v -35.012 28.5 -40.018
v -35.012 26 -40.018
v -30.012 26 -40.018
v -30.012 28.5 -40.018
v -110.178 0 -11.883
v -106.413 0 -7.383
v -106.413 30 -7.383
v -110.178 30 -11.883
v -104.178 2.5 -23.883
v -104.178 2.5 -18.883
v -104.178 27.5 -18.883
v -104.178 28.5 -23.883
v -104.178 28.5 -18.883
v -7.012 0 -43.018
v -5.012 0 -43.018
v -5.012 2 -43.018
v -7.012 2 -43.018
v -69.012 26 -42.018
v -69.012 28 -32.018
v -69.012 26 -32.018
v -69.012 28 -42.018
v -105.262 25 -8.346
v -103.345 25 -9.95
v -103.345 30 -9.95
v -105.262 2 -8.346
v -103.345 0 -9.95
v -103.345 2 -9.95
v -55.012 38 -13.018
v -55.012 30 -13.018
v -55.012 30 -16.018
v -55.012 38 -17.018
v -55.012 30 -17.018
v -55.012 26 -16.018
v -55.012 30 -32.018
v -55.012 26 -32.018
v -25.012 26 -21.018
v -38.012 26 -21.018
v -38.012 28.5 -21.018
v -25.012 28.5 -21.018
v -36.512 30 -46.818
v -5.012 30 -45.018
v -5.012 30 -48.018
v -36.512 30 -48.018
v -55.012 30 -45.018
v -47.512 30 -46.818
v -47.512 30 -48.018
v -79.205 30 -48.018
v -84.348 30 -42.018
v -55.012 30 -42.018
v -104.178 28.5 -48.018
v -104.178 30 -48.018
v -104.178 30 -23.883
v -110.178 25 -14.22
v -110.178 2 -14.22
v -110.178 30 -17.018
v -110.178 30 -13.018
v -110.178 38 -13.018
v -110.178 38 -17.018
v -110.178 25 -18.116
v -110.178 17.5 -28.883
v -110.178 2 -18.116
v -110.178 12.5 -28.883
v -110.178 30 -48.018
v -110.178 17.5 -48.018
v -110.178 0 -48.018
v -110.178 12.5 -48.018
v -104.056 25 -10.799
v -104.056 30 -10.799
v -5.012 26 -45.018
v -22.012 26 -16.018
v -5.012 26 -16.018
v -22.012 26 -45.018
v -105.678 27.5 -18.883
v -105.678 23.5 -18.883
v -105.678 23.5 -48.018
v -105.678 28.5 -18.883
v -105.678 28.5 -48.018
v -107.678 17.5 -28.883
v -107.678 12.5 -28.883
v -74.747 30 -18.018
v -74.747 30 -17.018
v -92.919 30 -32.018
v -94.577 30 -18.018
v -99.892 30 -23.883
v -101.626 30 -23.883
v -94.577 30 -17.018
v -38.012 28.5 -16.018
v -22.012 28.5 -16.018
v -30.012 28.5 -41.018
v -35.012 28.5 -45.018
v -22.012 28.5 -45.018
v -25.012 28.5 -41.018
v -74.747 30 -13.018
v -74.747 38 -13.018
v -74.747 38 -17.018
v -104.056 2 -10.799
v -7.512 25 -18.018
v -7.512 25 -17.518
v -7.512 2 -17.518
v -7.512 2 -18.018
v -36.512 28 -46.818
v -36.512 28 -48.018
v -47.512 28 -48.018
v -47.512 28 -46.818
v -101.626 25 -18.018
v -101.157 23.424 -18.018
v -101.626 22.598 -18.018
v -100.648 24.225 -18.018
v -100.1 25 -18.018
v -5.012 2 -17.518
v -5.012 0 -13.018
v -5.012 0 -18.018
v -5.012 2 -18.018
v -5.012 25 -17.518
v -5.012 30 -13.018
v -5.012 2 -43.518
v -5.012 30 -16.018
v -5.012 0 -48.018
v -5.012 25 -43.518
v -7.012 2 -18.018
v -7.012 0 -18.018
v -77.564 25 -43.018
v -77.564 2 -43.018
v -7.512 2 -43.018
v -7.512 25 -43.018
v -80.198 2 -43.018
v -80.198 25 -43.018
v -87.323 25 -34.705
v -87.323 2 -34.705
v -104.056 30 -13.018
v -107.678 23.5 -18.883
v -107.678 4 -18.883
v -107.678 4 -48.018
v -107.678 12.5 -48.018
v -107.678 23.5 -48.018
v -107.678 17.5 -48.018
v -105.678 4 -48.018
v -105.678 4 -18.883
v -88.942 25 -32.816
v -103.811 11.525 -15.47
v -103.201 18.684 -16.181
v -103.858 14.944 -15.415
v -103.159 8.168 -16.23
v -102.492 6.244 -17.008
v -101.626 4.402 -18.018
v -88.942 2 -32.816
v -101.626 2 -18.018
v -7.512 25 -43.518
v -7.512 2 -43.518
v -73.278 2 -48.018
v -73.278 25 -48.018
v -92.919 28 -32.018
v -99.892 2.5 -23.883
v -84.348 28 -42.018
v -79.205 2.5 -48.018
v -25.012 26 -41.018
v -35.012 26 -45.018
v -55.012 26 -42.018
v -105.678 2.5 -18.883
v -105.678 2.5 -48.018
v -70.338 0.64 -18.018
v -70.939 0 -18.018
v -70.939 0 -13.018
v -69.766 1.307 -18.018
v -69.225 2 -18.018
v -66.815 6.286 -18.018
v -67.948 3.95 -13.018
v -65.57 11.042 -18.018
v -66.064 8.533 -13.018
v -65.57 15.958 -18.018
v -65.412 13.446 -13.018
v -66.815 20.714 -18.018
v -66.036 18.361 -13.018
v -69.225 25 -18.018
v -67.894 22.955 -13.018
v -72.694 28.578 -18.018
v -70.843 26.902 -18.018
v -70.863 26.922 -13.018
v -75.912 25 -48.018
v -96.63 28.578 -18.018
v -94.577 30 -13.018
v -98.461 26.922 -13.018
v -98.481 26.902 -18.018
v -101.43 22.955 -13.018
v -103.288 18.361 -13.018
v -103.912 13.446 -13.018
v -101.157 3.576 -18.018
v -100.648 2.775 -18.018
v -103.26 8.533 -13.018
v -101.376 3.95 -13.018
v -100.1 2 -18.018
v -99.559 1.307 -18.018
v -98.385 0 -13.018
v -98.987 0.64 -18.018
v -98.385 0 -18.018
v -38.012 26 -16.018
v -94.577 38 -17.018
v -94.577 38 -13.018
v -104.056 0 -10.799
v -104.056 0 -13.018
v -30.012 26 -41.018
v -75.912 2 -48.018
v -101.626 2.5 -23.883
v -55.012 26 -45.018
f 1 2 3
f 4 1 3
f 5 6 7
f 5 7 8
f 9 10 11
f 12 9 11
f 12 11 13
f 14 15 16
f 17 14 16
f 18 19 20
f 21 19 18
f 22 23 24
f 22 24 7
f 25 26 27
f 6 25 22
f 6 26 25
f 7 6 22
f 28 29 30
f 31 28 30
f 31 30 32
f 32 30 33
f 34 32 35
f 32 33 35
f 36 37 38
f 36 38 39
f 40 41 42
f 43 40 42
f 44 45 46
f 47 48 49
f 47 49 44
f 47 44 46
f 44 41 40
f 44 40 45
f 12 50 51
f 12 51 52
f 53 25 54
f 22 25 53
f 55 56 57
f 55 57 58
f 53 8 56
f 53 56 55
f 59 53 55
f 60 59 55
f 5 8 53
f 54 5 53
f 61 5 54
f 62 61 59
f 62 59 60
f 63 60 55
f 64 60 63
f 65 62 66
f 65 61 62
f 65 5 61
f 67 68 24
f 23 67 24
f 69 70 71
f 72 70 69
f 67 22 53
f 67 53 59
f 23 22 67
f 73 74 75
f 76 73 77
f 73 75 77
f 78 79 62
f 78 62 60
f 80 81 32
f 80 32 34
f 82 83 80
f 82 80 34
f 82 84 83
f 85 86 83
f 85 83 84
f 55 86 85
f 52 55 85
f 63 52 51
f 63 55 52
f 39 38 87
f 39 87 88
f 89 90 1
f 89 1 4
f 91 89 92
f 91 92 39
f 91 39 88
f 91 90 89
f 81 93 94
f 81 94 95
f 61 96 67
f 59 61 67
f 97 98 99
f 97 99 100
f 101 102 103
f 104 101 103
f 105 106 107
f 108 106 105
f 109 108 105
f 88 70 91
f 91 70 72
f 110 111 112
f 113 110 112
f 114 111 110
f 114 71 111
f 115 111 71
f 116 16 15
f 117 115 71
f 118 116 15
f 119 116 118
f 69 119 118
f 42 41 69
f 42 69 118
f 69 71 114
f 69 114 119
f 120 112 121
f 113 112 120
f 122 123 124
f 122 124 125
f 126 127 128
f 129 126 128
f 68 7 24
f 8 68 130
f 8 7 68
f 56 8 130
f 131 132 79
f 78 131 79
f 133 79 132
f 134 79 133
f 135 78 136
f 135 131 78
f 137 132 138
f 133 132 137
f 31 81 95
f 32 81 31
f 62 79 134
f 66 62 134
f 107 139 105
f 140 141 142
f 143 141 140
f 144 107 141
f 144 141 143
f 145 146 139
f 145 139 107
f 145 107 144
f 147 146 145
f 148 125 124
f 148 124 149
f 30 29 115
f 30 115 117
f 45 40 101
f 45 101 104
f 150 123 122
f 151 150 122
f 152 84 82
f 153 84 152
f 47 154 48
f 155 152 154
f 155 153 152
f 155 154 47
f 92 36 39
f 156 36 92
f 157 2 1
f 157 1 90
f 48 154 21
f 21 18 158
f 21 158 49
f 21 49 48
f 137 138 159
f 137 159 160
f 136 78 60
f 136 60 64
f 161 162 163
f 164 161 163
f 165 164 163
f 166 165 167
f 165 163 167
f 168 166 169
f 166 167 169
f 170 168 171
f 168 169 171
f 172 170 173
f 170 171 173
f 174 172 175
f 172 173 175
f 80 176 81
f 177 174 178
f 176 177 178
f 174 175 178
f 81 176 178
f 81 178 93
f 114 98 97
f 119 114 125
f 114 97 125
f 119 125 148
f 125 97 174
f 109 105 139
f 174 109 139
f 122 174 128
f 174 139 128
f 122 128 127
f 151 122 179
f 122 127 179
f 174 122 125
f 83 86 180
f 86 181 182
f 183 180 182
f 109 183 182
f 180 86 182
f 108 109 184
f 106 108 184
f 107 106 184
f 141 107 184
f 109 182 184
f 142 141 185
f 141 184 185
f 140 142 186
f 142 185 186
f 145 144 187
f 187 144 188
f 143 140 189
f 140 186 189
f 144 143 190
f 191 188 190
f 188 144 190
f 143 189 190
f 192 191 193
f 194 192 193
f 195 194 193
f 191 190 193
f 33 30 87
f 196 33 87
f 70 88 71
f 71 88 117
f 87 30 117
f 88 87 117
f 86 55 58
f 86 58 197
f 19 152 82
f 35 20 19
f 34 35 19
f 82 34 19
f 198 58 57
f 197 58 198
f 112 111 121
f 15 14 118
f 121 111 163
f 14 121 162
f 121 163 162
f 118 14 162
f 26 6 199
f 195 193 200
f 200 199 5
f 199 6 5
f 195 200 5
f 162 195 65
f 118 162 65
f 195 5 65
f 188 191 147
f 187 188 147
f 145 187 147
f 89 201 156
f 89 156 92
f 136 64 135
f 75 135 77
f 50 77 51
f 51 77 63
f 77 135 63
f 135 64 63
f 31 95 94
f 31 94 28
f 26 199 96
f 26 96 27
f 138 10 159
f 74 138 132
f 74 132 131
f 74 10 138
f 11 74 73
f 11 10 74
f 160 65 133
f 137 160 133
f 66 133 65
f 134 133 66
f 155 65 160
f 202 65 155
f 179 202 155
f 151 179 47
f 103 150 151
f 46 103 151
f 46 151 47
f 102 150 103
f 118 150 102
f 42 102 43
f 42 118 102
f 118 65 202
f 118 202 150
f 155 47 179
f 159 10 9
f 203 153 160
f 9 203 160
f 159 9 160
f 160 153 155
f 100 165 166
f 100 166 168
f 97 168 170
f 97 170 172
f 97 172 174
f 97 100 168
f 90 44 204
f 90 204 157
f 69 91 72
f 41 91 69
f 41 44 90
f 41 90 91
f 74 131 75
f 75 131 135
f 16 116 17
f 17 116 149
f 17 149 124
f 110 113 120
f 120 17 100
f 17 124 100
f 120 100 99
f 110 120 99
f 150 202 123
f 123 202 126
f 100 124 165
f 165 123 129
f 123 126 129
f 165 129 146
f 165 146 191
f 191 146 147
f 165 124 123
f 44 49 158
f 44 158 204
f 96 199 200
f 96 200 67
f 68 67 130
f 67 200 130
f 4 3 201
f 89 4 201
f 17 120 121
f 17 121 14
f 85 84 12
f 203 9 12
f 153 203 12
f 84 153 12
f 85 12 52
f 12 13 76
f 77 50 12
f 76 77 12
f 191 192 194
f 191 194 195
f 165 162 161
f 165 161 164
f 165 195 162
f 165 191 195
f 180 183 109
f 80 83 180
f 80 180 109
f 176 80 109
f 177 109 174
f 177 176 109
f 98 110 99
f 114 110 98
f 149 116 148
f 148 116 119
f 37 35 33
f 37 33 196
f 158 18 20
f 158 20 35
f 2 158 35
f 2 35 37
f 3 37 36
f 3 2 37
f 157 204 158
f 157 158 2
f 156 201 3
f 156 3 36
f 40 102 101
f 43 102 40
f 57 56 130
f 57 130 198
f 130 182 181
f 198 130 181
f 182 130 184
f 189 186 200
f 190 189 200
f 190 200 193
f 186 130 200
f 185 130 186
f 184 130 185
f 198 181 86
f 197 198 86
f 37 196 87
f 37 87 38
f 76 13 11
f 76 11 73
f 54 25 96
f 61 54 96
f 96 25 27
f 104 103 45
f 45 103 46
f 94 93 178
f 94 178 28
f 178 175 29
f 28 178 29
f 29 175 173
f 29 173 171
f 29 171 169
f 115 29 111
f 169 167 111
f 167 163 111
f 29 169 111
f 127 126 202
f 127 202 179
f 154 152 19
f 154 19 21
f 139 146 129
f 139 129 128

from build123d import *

# Parameters (mm, degrees)
BOSS_EXTRUDE3_DEPTH       = 30
SKETCH6_W                 = 25
SKETCH6_H                 = 23
CUT_EXTRUDE1_DEPTH        = 86
SKETCH7_W                 = 25
SKETCH7_H                 = 5
CUT_EXTRUDE2_DEPTH        = 7.5
SKETCH8_W                 = 25
SKETCH8_H                 = 2
CUT_EXTRUDE3_DEPTH        = 1
SKETCH9_R                 = 19.25
CUT_EXTRUDE4_DEPTH        = 5
BOSS_EXTRUDE4_DEPTH       = 30
SKETCH10_W                = 1.856561782
SKETCH10_H                = 30
BOSS_EXTRUDE5_DEPTH       = 3
BOSS_EXTRUDE6_DEPTH       = 30
SKETCH11_W                = 2.5
SKETCH11_H                = 23
CUT_EXTRUDE5_DEPTH        = 34.579503854
SKETCH12_W                = 29.135235428
SKETCH12_H                = 25
CUT_EXTRUDE6_DEPTH        = 3.5
SKETCH13_W                = 19.135235428
SKETCH13_H                = 5
CUT_EXTRUDE7_DEPTH        = 3.5
SKETCH14_W                = 29.135235428
SKETCH14_H                = 4
BOSS_EXTRUDE7_DEPTH       = 2
SKETCH16_W                = 29.135235428
SKETCH16_H                = 1.5
BOSS_EXTRUDE8_DEPTH       = 2
SKETCH17_W                = 2.551467674
SKETCH17_H                = 30
BOSS_EXTRUDE9_DEPTH       = 5
BOSS_EXTRUDE10_REACH      = 85.266
SKETCH18_W                = 29.135235428
SKETCH18_H                = 2.5
SKETCH19_W                = 2.48850009
SKETCH19_H                = 23
BOSS_EXTRUDE11_DEPTH      = 2
CUT_EXTRUDE8_START        = -2.4885
SKETCH20_W                = 2
SKETCH20_H                = 23
CUT_EXTRUDE8_DEPTH        = 21.736568
BOSS_EXTRUDE12_REACH      = 82.714
SKETCH21_W                = 2.023287715
SKETCH21_H                = 27.5
SKETCH22_W                = 35
SKETCH22_H                = 30
BOSS_EXTRUDE13_DEPTH      = 15.9
BOSS_EXTRUDE13_DEPTH_BACK = 7.5
SKETCH23_W                = 25
SKETCH23_H                = 23
CUT_EXTRUDE9_DEPTH        = 24.4
SKETCH24_W                = 25
SKETCH24_H                = 5
CUT_EXTRUDE10_DEPTH       = 2
SKETCH25_W                = 50
SKETCH25_H                = 29
CUT_EXTRUDE11_DEPTH       = 4
SKETCH26_W                = 3
SKETCH26_H                = 29
BOSS_EXTRUDE14_DEPTH      = 2.5
SKETCH27_W                = 5
SKETCH27_H                = 5
BOSS_EXTRUDE15_DEPTH      = 2.5
BOSS_EXTRUDE16_REACH      = 27
SKETCH28_W                = 4
SKETCH28_H                = 2.5
SKETCH29_W                = 13
SKETCH29_H                = 5
BOSS_EXTRUDE17_DEPTH      = 2.5
SKETCH30_W                = 10
SKETCH30_H                = 4
CUT_EXTRUDE12_DEPTH       = 14
CUT_EXTRUDE13_REACH       = 43.166
SKETCH31_W                = 10
SKETCH31_H                = 2
SKETCH32_W                = 2
SKETCH32_H                = 25
CUT_EXTRUDE14_DEPTH       = 27
SKETCH33_W                = 19.734733993
SKETCH33_H                = 4
BOSS_EXTRUDE18_DEPTH      = 8
SKETCH34_W                = 15.60048738
SKETCH34_H                = 4
BOSS_EXTRUDE19_DEPTH      = 8
SKETCH35_W                = 26
SKETCH35_H                = 23
CUT_EXTRUDE15_DEPTH       = 2.5
SKETCH36_W                = 25
SKETCH36_H                = 1
BOSS_EXTRUDE20_DEPTH      = 2
SKETCH39_W                = 1.5
SKETCH39_H                = 1
CUT_EXTRUDE16_DEPTH       = 29.135235
SKETCH42_W                = 11
SKETCH42_H                = 2
CUT_EXTRUDE17_DEPTH       = 1.2


with BuildPart() as part:
    # Sketch2 → Boss-Extrude3 (new body)
    with BuildSketch(Plane(origin=(0, 0, 0), x_dir=(1, 0, 0), z_dir=(0, 1, 0))):
        Polygon((-105.912162162, 13.018018018), (-20.912162162, 13.018018018), (-20.912162162, 48.018018018), (-75.912162162, 48.018018018), align=None)
    extrude(amount=BOSS_EXTRUDE3_DEPTH)

    # Sketch6 → Cut-Extrude1 (cut, through all)
    with BuildSketch(Plane(origin=(-20.912162162, 0, 0), x_dir=(0, 0, -1), z_dir=(1, 0, 0))):
        with Locations((30.518018018, 13.5)):
            Rectangle(SKETCH6_W, SKETCH6_H)
    extrude(amount=-CUT_EXTRUDE1_DEPTH, mode=Mode.SUBTRACT)

    # Sketch7 → Cut-Extrude2 (cut)
    with BuildSketch(Plane(origin=(-20.912162162, 0, 0), x_dir=(0, 0, -1), z_dir=(1, 0, 0))):
        with Locations((30.518018018, 27.5)):
            Rectangle(SKETCH7_W, SKETCH7_H)
    extrude(amount=-CUT_EXTRUDE2_DEPTH, mode=Mode.SUBTRACT)

    # Sketch8 → Cut-Extrude3 (cut)
    with BuildSketch(Plane(origin=(-20.912162162, 0, 0), x_dir=(0, 0, -1), z_dir=(1, 0, 0))):
        with Locations((30.518018018, 1)):
            Rectangle(SKETCH8_W, SKETCH8_H)
    extrude(amount=-CUT_EXTRUDE3_DEPTH, mode=Mode.SUBTRACT)

    # Sketch9 → Cut-Extrude4 (cut)
    with BuildSketch(Plane.XY.offset(-13.018018018)):
        with Locations((-84.662162162, 13.5)):
            Circle(SKETCH9_R)
    extrude(amount=-CUT_EXTRUDE4_DEPTH, mode=Mode.SUBTRACT)

    # Sketch3 → Boss-Extrude4 (add)
    with BuildSketch(Plane(origin=(0, 0, 0), x_dir=(1, 0, 0), z_dir=(0, 1, 0))):
        Polygon((-106.412808957, 7.383361614), (-110.17791555, 11.88278259), (-79.204856611, 48.018018018), (-75.912162162, 48.018018018), (-105.912162162, 13.018018018), (-103.345157358, 9.950366419), align=None)
    extrude(amount=BOSS_EXTRUDE4_DEPTH)

    # Sketch10 → Boss-Extrude5 (add)
    with BuildSketch(Plane.XY.offset(-13.018018018)):
        with Locations((-104.983881271, 15)):
            Rectangle(SKETCH10_W, SKETCH10_H)
    extrude(amount=BOSS_EXTRUDE5_DEPTH)

    # Sketch4 → Boss-Extrude6 (add)
    with BuildSketch(Plane(origin=(0, 0, 0), x_dir=(1, 0, 0), z_dir=(0, 1, 0))):
        Polygon((-110.17791555, 11.88278259), (-110.17791555, 48.018018018), (-104.17791555, 48.018018018), (-104.17791555, 18.88278259), align=None)
    extrude(amount=BOSS_EXTRUDE6_DEPTH)

    # Sketch11 → Cut-Extrude5 (cut, through all)
    with BuildSketch(Plane(origin=(-47.459390138, 0, -56.715466139), x_dir=(0.7669129, 0, -0.641751201), z_dir=(0.641751201, 0, 0.7669129))):
        with Locations((-74.121074711, 13.5)):
            Rectangle(SKETCH11_W, SKETCH11_H)
    extrude(amount=-CUT_EXTRUDE5_DEPTH, mode=Mode.SUBTRACT)

    # Sketch12 → Cut-Extrude6 (cut)
    with BuildSketch(Plane(origin=(-104.17791555, 0, 0), x_dir=(0, 0, -1), z_dir=(1, 0, 0))):
        with Locations((33.450400304, 15)):
            Rectangle(SKETCH12_W, SKETCH12_H)
    extrude(amount=-CUT_EXTRUDE6_DEPTH, mode=Mode.SUBTRACT)

    # Sketch13 → Cut-Extrude7 (cut, through all)
    with BuildSketch(Plane(origin=(-107.67791555, 0, 0), x_dir=(0, 0, -1), z_dir=(1, 0, 0))):
        with Locations((38.450400304, 15)):
            Rectangle(SKETCH13_W, SKETCH13_H)
    extrude(amount=-CUT_EXTRUDE7_DEPTH, mode=Mode.SUBTRACT)

    # Sketch14 → Boss-Extrude7 (add)
    with BuildSketch(Plane(origin=(-107.67791555, 0, 0), x_dir=(0, 0, -1), z_dir=(1, 0, 0))):
        with Locations((33.450400304, 25.5)):
            Rectangle(SKETCH14_W, SKETCH14_H)
    extrude(amount=BOSS_EXTRUDE7_DEPTH)

    # Sketch16 → Boss-Extrude8 (add)
    with BuildSketch(Plane(origin=(-107.67791555, 0, 0), x_dir=(0, 0, -1), z_dir=(1, 0, 0))):
        with Locations((33.450400304, 3.25)):
            Rectangle(SKETCH16_W, SKETCH16_H)
    extrude(amount=BOSS_EXTRUDE8_DEPTH)

    # Sketch17 → Boss-Extrude9 (add)
    with BuildSketch(Plane(origin=(0, 0, -18.88278259), x_dir=(-1, 0, 0), z_dir=(0, 0, -1))):
        with Locations((102.902181713, 15)):
            Rectangle(SKETCH17_W, SKETCH17_H)
    extrude(amount=BOSS_EXTRUDE9_DEPTH)

    # Boss-Extrude10: up to this face of the body (flat: up to its plane)
    boss_extrude10_end = Plane(part.part.faces().sort_by_distance((-90.415652244, 15, -34.938756447))[0])
    # Sketch18 → Boss-Extrude10 (add, up to the picked face)
    with BuildSketch(Plane(origin=(-104.17791555, 0, 0), x_dir=(0, 0, -1), z_dir=(1, 0, 0)), mode=Mode.PRIVATE) as boss_extrude10_sk1:
        with Locations((33.450400304, 1.25)):
            Rectangle(SKETCH18_W, SKETCH18_H)
    boss_extrude10_tool1 = split(extrude(boss_extrude10_sk1.sketch, amount=BOSS_EXTRUDE10_REACH, mode=Mode.PRIVATE), bisect_by=boss_extrude10_end, keep=Keep.BOTH, mode=Mode.PRIVATE)
    add(boss_extrude10_tool1.solids().sort_by_distance((-104.177916, 1.25, -33.4504))[0])

    # Sketch19 → Boss-Extrude11 (add)
    with BuildSketch(Plane(origin=(-67.487678855, 0, -57.846581876), x_dir=(0.650791373, 0, -0.759256602), z_dir=(0.759256602, 0, 0.650791373))):
        with Locations((-31.723015124, 13.5)):
            Rectangle(SKETCH19_W, SKETCH19_H)
    extrude(amount=BOSS_EXTRUDE11_DEPTH)

    # Sketch20 → Cut-Extrude8 (cut)
    with BuildSketch(Plane(origin=(-19.835317387, 0, 23.141203618), x_dir=(-0.759256602, 0, -0.650791373), z_dir=(0.650791373, 0, -0.759256602)).offset(CUT_EXTRUDE8_START)):
        with Locations((87.886522218, 13.5)):
            Rectangle(SKETCH20_W, SKETCH20_H)
    extrude(amount=CUT_EXTRUDE8_DEPTH, mode=Mode.SUBTRACT)

    # Boss-Extrude12: up to this face of the body (flat: up to its plane)
    boss_extrude12_end = Plane(part.part.faces().sort_by_distance((-90.415652244, 16.25, -34.938756447))[0])
    # Sketch21 → Boss-Extrude12 (add, up to the picked face)
    with BuildSketch(Plane(origin=(-101.626447876, 0, 0), x_dir=(0, 0, -1), z_dir=(1, 0, 0)), mode=Mode.PRIVATE) as boss_extrude12_sk1:
        with Locations((22.871138733, 16.25)):
            Rectangle(SKETCH21_W, SKETCH21_H)
    boss_extrude12_tool1 = split(extrude(boss_extrude12_sk1.sketch, amount=BOSS_EXTRUDE12_REACH, mode=Mode.PRIVATE), bisect_by=boss_extrude12_end, keep=Keep.BOTH, mode=Mode.PRIVATE)
    add(boss_extrude12_tool1.solids().sort_by_distance((-101.626448, 16.25, -22.871139))[0])

    # Sketch22 → Boss-Extrude13 (add, two sides)
    with BuildSketch(Plane(origin=(-20.912162162, 0, 0), x_dir=(0, 0, -1), z_dir=(1, 0, 0))) as boss_extrude13_sk:
        with Locations((30.518018018, 15)):
            Rectangle(SKETCH22_W, SKETCH22_H)
    extrude(amount=BOSS_EXTRUDE13_DEPTH)
    extrude(boss_extrude13_sk.sketch, amount=-BOSS_EXTRUDE13_DEPTH_BACK)

    # Sketch23 → Cut-Extrude9 (cut, through all)
    with BuildSketch(Plane.ZY.offset(28.412162162)):
        with Locations((-30.518018018, 13.5)):
            Rectangle(SKETCH23_W, SKETCH23_H)
    extrude(amount=-CUT_EXTRUDE9_DEPTH, mode=Mode.SUBTRACT)

    # Sketch24 → Cut-Extrude10 (cut)
    with BuildSketch(Plane(origin=(-5.012162162, 0, 0), x_dir=(0, 0, -1), z_dir=(1, 0, 0))):
        with Locations((30.518018018, 27.5)):
            Rectangle(SKETCH24_W, SKETCH24_H)
    extrude(amount=-CUT_EXTRUDE10_DEPTH, mode=Mode.SUBTRACT)

    # Sketch25 → Cut-Extrude11 (cut)
    with BuildSketch(Plane(origin=(0, 30, 0), x_dir=(1, 0, 0), z_dir=(0, 1, 0))):
        with Locations((-30.012162162, 30.518018018)):
            Rectangle(SKETCH25_W, SKETCH25_H)
    extrude(amount=-CUT_EXTRUDE11_DEPTH, mode=Mode.SUBTRACT)

    # Sketch26 → Boss-Extrude14 (add)
    with BuildSketch(Plane(origin=(0, 26, 0), x_dir=(1, 0, 0), z_dir=(0, 1, 0))):
        with Locations((-23.512162162, 30.518018018)):
            Rectangle(SKETCH26_W, SKETCH26_H)
    extrude(amount=BOSS_EXTRUDE14_DEPTH)

    # Sketch27 → Boss-Extrude15 (add)
    with BuildSketch(Plane(origin=(0, 26, 0), x_dir=(1, 0, 0), z_dir=(0, 1, 0))):
        with Locations((-32.512162162, 42.518018018)):
            Rectangle(SKETCH27_W, SKETCH27_H)
    extrude(amount=BOSS_EXTRUDE15_DEPTH)

    # Sketch28 → Boss-Extrude16 (add, up to next)
    with BuildSketch(Plane(origin=(-30.012162162, 0, 0), x_dir=(0, 0, -1), z_dir=(1, 0, 0)), mode=Mode.PRIVATE) as boss_extrude16_sk1:
        with Locations((43.018018018, 27.25)):
            Rectangle(SKETCH28_W, SKETCH28_H)
    boss_extrude16_tool1 = extrude(boss_extrude16_sk1.sketch, amount=BOSS_EXTRUDE16_REACH, mode=Mode.PRIVATE) - part.part
    add(boss_extrude16_tool1.solids().sort_by_distance((-30.012162, 27.25, -43.018018))[0])

    # Sketch29 → Boss-Extrude17 (add)
    with BuildSketch(Plane(origin=(0, 26, 0), x_dir=(1, 0, 0), z_dir=(0, 1, 0))):
        with Locations((-31.512162162, 18.518018018)):
            Rectangle(SKETCH29_W, SKETCH29_H)
    extrude(amount=BOSS_EXTRUDE17_DEPTH)

    # Sketch30 → Cut-Extrude12 (cut)
    with BuildSketch(Plane(origin=(-55.012162162, 0, 0), x_dir=(0, 0, -1), z_dir=(1, 0, 0))):
        with Locations((37.018018018, 28)):
            Rectangle(SKETCH30_W, SKETCH30_H)
    extrude(amount=-CUT_EXTRUDE12_DEPTH, mode=Mode.SUBTRACT)

    # Sketch31 → Cut-Extrude13 (cut, up to next)
    with BuildSketch(Plane(origin=(-69.012162162, 0, 0), x_dir=(0, 0, -1), z_dir=(1, 0, 0)), mode=Mode.PRIVATE) as cut_extrude13_sk1:
        with Locations((37.018018018, 29)):
            Rectangle(SKETCH31_W, SKETCH31_H)
    cut_extrude13_tool1 = extrude(cut_extrude13_sk1.sketch, amount=-CUT_EXTRUDE13_REACH, mode=Mode.PRIVATE) & part.part
    add(cut_extrude13_tool1.solids().sort_by_distance((-69.012162, 29, -37.018018))[0], mode=Mode.SUBTRACT)

    # Sketch32 → Cut-Extrude14 (cut, through all)
    with BuildSketch(Plane(origin=(0, 26, 0), x_dir=(1, 0, 0), z_dir=(0, 1, 0))):
        with Locations((-6.012162162, 30.518018018)):
            Rectangle(SKETCH32_W, SKETCH32_H)
    extrude(amount=-CUT_EXTRUDE14_DEPTH, mode=Mode.SUBTRACT)

    # Sketch33 → Boss-Extrude18 (add)
    with BuildSketch(Plane(origin=(0, 30, 0), x_dir=(1, 0, 0), z_dir=(0, 1, 0))):
        with Locations((-64.879529159, 15.018018018)):
            Rectangle(SKETCH33_W, SKETCH33_H)
    extrude(amount=BOSS_EXTRUDE18_DEPTH)

    # Sketch34 → Boss-Extrude19 (add)
    with BuildSketch(Plane(origin=(0, 30, 0), x_dir=(1, 0, 0), z_dir=(0, 1, 0))):
        with Locations((-102.37767186, 15.018018018)):
            Rectangle(SKETCH34_W, SKETCH34_H)
    extrude(amount=BOSS_EXTRUDE19_DEPTH)

    # Sketch35 → Cut-Extrude15 (cut)
    with BuildSketch(Plane(origin=(-5.012162162, 0, 0), x_dir=(0, 0, -1), z_dir=(1, 0, 0))):
        with Locations((30.518018018, 13.5)):
            Rectangle(SKETCH35_W, SKETCH35_H)
    extrude(amount=-CUT_EXTRUDE15_DEPTH, mode=Mode.SUBTRACT)

    # Sketch36 → Boss-Extrude20 (add)
    with BuildSketch(Plane(origin=(-7.012162162, 0, 0), x_dir=(0, 0, -1), z_dir=(1, 0, 0))):
        with Locations((30.518018018, 25.5)):
            Rectangle(SKETCH36_W, SKETCH36_H)
    extrude(amount=BOSS_EXTRUDE20_DEPTH)

    # Sketch39 → Cut-Extrude16 (cut)
    with BuildSketch(Plane(origin=(0, 0, -48.018018018), x_dir=(-1, 0, 0), z_dir=(0, 0, -1))):
        with Locations((104.92791555, 28)):
            Rectangle(SKETCH39_W, SKETCH39_H)
    extrude(amount=-CUT_EXTRUDE16_DEPTH, mode=Mode.SUBTRACT)

    # Sketch42 → Cut-Extrude17 (cut)
    with BuildSketch(Plane(origin=(0, 0, -48.018018018), x_dir=(-1, 0, 0), z_dir=(0, 0, -1))):
        with Locations((42.012162162, 29)):
            Rectangle(SKETCH42_W, SKETCH42_H)
    extrude(amount=-CUT_EXTRUDE17_DEPTH, mode=Mode.SUBTRACT)


solid = part.part
